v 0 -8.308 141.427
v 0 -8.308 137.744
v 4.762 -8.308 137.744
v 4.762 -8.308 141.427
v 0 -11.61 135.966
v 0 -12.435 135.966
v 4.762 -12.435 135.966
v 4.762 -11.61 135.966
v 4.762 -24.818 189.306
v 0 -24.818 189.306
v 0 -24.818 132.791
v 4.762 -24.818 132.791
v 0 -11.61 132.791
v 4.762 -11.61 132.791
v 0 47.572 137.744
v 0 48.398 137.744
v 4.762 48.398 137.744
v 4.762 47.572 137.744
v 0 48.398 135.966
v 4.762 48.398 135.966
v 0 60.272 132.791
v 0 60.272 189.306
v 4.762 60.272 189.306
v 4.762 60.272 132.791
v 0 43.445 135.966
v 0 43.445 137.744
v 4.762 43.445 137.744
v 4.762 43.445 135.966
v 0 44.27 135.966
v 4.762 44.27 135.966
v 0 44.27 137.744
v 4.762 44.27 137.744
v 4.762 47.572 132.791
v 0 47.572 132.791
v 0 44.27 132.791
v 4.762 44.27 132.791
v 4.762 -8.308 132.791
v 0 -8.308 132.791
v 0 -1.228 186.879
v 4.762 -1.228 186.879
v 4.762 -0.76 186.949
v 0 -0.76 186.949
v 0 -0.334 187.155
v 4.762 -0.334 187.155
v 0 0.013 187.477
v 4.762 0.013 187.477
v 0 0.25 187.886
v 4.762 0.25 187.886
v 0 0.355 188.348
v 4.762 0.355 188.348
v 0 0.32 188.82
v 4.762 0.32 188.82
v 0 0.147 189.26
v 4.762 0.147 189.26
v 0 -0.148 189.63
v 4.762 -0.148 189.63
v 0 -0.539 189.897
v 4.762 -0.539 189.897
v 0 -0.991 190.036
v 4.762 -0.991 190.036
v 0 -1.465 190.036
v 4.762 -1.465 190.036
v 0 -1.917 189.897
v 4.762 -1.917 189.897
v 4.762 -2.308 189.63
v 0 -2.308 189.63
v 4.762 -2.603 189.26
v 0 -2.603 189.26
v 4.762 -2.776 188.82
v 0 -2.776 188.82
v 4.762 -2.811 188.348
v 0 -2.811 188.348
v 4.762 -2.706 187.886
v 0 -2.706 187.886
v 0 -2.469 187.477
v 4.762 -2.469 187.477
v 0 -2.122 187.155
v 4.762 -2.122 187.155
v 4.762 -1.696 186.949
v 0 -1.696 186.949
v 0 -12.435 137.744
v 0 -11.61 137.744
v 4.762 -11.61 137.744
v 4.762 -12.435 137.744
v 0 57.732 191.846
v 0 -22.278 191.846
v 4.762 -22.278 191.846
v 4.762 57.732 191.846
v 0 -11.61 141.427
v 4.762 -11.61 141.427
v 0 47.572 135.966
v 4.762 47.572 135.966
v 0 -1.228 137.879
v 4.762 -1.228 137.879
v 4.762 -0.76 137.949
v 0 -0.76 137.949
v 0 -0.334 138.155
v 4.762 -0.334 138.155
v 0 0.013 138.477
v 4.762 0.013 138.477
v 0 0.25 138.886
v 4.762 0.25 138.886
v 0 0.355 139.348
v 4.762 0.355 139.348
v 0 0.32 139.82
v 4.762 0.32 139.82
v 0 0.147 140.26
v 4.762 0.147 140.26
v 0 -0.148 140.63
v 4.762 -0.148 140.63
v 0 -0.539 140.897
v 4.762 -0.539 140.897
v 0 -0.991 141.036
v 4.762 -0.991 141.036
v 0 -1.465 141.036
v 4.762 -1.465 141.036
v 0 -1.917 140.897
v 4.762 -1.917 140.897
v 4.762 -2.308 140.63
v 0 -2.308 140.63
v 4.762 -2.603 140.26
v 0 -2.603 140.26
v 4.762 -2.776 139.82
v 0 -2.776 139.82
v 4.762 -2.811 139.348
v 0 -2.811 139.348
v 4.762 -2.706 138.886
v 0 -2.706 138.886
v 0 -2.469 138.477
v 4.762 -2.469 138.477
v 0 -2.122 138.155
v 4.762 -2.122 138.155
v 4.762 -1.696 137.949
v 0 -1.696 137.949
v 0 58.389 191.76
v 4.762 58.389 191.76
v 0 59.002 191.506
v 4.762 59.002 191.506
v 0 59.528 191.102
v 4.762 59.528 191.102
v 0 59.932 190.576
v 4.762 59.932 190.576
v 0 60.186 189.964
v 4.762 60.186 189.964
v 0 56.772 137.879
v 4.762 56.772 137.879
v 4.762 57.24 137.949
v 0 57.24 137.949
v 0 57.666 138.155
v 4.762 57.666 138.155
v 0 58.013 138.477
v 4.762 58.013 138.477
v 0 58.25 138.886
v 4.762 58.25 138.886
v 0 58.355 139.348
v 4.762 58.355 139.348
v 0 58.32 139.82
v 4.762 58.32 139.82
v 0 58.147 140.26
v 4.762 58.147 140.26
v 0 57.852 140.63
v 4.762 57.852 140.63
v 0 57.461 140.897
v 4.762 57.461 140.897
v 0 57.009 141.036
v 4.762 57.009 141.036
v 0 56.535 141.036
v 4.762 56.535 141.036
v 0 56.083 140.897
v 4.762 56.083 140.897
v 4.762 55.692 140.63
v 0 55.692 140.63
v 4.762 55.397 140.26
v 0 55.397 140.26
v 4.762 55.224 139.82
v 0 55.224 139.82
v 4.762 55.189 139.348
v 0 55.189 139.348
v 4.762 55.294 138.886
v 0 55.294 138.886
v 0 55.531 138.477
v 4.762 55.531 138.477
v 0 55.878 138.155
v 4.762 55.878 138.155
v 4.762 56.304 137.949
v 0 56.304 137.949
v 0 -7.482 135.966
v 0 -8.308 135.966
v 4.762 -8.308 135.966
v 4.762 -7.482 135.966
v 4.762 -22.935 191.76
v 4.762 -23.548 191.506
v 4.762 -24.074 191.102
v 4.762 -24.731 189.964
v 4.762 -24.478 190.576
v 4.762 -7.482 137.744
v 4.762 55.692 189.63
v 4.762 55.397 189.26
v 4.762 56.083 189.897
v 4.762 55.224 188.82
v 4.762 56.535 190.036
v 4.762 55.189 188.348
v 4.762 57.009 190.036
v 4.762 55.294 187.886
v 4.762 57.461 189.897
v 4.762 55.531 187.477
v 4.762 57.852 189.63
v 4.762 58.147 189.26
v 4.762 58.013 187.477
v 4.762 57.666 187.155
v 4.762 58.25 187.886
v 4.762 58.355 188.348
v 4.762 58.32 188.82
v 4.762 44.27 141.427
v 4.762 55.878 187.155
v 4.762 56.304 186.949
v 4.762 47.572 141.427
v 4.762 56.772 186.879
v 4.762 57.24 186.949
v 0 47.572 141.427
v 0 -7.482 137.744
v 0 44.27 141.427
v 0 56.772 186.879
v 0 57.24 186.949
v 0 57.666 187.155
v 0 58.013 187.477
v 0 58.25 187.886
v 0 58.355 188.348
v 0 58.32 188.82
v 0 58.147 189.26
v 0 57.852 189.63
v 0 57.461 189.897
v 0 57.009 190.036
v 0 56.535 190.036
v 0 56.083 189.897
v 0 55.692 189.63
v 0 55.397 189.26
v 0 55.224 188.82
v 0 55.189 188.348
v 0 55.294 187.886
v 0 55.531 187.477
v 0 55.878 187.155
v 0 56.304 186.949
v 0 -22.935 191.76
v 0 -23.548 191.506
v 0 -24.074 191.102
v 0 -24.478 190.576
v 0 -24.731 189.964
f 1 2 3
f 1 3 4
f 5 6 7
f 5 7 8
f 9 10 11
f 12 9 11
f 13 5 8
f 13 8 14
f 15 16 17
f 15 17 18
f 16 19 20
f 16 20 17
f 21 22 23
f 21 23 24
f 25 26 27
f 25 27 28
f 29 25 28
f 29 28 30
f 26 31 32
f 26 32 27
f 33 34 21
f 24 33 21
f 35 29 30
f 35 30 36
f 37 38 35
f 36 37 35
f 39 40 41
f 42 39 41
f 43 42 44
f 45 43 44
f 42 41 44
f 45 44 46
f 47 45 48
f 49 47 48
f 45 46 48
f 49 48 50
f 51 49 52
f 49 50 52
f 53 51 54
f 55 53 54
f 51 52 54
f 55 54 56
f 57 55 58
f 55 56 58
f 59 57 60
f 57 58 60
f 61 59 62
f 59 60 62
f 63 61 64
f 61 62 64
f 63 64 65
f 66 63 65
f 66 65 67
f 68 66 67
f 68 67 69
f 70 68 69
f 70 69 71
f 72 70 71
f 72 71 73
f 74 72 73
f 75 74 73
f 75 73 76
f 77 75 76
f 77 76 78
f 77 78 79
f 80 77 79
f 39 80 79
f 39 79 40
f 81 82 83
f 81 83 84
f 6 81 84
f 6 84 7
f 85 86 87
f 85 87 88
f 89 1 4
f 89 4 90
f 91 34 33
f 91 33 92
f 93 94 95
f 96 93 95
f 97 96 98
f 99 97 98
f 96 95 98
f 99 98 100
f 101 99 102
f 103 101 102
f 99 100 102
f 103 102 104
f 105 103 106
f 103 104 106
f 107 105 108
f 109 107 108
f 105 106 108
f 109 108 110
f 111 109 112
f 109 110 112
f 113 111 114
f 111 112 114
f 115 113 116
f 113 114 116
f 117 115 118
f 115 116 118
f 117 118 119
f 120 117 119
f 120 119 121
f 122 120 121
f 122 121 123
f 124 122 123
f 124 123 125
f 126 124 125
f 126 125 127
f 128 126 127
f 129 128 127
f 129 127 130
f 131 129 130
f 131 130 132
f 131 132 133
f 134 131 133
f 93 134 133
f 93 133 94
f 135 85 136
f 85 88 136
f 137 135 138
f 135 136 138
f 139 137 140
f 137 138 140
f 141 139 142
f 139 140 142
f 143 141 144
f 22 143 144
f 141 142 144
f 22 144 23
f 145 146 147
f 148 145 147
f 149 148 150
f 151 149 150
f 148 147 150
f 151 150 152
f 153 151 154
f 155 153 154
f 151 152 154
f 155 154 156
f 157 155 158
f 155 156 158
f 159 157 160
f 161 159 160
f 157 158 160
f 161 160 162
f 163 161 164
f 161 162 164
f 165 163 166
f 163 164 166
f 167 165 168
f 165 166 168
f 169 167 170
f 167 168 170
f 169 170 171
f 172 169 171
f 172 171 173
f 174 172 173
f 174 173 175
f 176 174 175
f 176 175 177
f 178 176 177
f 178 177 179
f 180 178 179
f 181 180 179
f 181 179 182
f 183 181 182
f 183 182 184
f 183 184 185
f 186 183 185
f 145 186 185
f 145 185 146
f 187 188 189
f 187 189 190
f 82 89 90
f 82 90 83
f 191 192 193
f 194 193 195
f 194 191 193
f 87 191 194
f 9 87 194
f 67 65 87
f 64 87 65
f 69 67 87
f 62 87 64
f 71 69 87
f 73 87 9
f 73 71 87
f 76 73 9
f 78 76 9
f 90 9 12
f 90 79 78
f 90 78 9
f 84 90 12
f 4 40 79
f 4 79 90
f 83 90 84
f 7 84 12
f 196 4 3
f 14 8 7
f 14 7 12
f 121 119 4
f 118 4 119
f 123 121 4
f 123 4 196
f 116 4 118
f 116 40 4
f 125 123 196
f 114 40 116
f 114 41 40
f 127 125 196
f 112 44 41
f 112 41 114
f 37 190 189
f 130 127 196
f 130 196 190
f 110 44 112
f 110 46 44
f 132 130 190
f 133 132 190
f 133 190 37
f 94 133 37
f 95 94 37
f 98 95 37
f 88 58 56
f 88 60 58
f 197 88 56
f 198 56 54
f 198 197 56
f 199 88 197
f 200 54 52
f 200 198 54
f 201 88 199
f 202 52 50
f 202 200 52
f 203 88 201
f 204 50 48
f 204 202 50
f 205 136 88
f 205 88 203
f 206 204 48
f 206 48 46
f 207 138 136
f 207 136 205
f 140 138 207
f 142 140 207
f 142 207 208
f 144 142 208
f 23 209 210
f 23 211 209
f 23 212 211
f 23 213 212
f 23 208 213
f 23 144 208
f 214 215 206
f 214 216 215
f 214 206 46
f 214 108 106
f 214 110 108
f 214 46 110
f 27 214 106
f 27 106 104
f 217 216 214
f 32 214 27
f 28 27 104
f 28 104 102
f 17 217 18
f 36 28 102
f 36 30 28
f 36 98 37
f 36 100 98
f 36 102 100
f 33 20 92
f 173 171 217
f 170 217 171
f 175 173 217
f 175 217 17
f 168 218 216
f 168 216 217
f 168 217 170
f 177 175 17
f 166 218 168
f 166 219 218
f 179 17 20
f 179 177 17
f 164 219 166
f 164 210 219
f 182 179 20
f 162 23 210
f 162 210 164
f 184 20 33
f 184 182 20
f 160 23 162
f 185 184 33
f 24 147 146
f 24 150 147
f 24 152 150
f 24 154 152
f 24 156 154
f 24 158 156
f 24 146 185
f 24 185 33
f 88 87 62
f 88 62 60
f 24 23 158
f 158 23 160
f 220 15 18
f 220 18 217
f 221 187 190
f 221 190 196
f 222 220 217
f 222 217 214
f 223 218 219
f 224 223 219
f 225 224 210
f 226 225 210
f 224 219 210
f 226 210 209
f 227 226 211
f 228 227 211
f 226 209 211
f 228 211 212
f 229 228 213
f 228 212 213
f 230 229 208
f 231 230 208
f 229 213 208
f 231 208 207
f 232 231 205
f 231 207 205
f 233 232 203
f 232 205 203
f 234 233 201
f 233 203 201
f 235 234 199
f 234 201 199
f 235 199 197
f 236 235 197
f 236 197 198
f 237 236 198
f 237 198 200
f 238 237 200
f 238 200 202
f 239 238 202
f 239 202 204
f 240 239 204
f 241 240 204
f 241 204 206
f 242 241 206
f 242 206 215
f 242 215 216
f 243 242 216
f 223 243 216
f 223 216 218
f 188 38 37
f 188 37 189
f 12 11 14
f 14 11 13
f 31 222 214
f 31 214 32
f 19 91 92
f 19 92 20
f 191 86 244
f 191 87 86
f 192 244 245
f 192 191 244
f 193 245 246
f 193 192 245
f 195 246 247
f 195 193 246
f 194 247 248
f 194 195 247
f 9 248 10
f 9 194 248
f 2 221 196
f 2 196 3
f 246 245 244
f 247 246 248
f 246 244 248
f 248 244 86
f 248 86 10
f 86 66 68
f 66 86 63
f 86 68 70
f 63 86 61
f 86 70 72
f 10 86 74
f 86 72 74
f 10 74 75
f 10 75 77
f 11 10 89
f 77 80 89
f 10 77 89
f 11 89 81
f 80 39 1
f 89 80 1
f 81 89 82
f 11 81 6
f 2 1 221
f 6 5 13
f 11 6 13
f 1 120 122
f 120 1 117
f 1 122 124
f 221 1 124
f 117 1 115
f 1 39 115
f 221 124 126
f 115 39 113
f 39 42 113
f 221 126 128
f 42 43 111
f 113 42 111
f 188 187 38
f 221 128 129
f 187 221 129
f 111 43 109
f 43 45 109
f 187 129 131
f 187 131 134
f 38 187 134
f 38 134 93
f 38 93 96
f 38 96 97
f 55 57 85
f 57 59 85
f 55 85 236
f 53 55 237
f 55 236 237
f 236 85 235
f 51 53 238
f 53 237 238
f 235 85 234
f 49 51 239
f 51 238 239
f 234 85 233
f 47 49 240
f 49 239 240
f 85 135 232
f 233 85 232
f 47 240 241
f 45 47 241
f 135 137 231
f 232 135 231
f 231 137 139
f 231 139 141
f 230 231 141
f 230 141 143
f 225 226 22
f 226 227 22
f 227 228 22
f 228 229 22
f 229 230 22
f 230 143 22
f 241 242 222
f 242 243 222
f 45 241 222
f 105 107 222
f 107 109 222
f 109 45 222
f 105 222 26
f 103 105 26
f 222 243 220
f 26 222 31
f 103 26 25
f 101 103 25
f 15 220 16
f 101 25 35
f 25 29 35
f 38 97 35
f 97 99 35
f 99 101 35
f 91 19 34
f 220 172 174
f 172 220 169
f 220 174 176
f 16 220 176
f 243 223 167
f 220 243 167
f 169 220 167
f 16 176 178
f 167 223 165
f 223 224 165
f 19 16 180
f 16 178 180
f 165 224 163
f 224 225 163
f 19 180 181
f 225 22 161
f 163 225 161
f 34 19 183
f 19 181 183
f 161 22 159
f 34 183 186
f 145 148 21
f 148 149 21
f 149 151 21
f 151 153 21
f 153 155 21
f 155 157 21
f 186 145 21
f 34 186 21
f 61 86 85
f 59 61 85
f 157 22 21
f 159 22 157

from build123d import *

# Parameters (mm, degrees)
SKETCH1_W           = 59.055
SKETCH1_H           = 85.09
BOSS_EXTRUDE1_DEPTH = 4.7625
CUT_EXTRUDE1_REACH  = 203.148
SKETCH2_R           = 1.5875
CUT_EXTRUDE2_DEPTH  = 202.147856386
FILLET1_R           = 2.54


with BuildPart() as part:
    # Sketch1 → Boss-Extrude1 (new body)
    with BuildSketch(Plane(origin=(0, 0, 0), x_dir=(0, 0, -1), z_dir=(1, 0, 0))):
        with Locations((-162.318935185, 17.727083333)):
            Rectangle(SKETCH1_W, SKETCH1_H)
    extrude(amount=BOSS_EXTRUDE1_DEPTH)

    # Sketch2 → Cut-Extrude1 (cut, up to next)
    with BuildSketch(Plane(origin=(4.7625, 0, 0), x_dir=(0, 0, -1), z_dir=(1, 0, 0)), mode=Mode.PRIVATE) as cut_extrude1_sk1:
        with Locations((-188.466435185, -1.227916667)):
            Circle(SKETCH2_R)
    cut_extrude1_tool1 = extrude(cut_extrude1_sk1.sketch, amount=-CUT_EXTRUDE1_REACH, mode=Mode.PRIVATE) & part.part
    # Sketch2 → Cut-Extrude1 (cut, up to next)
    with BuildSketch(Plane(origin=(4.7625, 0, 0), x_dir=(0, 0, -1), z_dir=(1, 0, 0)), mode=Mode.PRIVATE) as cut_extrude1_sk2:
        with Locations((-139.466435185, -1.227916667)):
            Circle(SKETCH2_R)
    cut_extrude1_tool2 = extrude(cut_extrude1_sk2.sketch, amount=-CUT_EXTRUDE1_REACH, mode=Mode.PRIVATE) & part.part
    # Sketch2 → Cut-Extrude1 (cut, up to next)
    with BuildSketch(Plane(origin=(4.7625, 0, 0), x_dir=(0, 0, -1), z_dir=(1, 0, 0)), mode=Mode.PRIVATE) as cut_extrude1_sk3:
        with Locations((-139.466435185, 56.772083333)):
            Circle(SKETCH2_R)
    cut_extrude1_tool3 = extrude(cut_extrude1_sk3.sketch, amount=-CUT_EXTRUDE1_REACH, mode=Mode.PRIVATE) & part.part
    # Sketch2 → Cut-Extrude1 (cut, up to next)
    with BuildSketch(Plane(origin=(4.7625, 0, 0), x_dir=(0, 0, -1), z_dir=(1, 0, 0)), mode=Mode.PRIVATE) as cut_extrude1_sk4:
        with Locations((-188.466435185, 56.772083333)):
            Circle(SKETCH2_R)
    cut_extrude1_tool4 = extrude(cut_extrude1_sk4.sketch, amount=-CUT_EXTRUDE1_REACH, mode=Mode.PRIVATE) & part.part
    add(cut_extrude1_tool1.solids().sort_by_distance((4.7625, -1.227917, 188.466435))[0], mode=Mode.SUBTRACT)
    add(cut_extrude1_tool2.solids().sort_by_distance((4.7625, -1.227917, 139.466435))[0], mode=Mode.SUBTRACT)
    add(cut_extrude1_tool3.solids().sort_by_distance((4.7625, 56.772083, 139.466435))[0], mode=Mode.SUBTRACT)
    add(cut_extrude1_tool4.solids().sort_by_distance((4.7625, 56.772083, 188.466435))[0], mode=Mode.SUBTRACT)

    # Sketch3 → Cut-Extrude2 (cut, through all)
    with BuildSketch(Plane.ZY):
        Polygon((132.791435185, 47.572083333), (135.966435185, 47.572083333), (135.966435185, 48.397583333), (137.744435185, 48.397583333), (137.744435185, 47.572083333), (141.427435185, 47.572083333), (141.427435185, 44.270083333), (137.744435185, 44.270083333), (137.744435185, 43.444583333), (135.966435185, 43.444583333), (135.966435185, 44.270083333), (132.791435185, 44.270083333), align=None)
        Polygon((132.791435185, -8.307916667), (135.966435185, -8.307916667), (135.966435185, -7.482416667), (137.744435185, -7.482416667), (137.744435185, -8.307916667), (141.427435185, -8.307916667), (141.427435185, -11.609916667), (137.744435185, -11.609916667), (137.744435185, -12.435416667), (135.966435185, -12.435416667), (135.966435185, -11.609916667), (132.791435185, -11.609916667), align=None)
    extrude(amount=-CUT_EXTRUDE2_DEPTH, mode=Mode.SUBTRACT)

    # Fillet1
    fillet1_edges = [part.edges().sort_by_distance(p)[0] for p in [
        (2.38125, -24.817916667, 191.846435185),
        (2.38125, 60.272083333, 191.846435185),
    ]]
    fillet(fillet1_edges, radius=FILLET1_R)


solid = part.part
